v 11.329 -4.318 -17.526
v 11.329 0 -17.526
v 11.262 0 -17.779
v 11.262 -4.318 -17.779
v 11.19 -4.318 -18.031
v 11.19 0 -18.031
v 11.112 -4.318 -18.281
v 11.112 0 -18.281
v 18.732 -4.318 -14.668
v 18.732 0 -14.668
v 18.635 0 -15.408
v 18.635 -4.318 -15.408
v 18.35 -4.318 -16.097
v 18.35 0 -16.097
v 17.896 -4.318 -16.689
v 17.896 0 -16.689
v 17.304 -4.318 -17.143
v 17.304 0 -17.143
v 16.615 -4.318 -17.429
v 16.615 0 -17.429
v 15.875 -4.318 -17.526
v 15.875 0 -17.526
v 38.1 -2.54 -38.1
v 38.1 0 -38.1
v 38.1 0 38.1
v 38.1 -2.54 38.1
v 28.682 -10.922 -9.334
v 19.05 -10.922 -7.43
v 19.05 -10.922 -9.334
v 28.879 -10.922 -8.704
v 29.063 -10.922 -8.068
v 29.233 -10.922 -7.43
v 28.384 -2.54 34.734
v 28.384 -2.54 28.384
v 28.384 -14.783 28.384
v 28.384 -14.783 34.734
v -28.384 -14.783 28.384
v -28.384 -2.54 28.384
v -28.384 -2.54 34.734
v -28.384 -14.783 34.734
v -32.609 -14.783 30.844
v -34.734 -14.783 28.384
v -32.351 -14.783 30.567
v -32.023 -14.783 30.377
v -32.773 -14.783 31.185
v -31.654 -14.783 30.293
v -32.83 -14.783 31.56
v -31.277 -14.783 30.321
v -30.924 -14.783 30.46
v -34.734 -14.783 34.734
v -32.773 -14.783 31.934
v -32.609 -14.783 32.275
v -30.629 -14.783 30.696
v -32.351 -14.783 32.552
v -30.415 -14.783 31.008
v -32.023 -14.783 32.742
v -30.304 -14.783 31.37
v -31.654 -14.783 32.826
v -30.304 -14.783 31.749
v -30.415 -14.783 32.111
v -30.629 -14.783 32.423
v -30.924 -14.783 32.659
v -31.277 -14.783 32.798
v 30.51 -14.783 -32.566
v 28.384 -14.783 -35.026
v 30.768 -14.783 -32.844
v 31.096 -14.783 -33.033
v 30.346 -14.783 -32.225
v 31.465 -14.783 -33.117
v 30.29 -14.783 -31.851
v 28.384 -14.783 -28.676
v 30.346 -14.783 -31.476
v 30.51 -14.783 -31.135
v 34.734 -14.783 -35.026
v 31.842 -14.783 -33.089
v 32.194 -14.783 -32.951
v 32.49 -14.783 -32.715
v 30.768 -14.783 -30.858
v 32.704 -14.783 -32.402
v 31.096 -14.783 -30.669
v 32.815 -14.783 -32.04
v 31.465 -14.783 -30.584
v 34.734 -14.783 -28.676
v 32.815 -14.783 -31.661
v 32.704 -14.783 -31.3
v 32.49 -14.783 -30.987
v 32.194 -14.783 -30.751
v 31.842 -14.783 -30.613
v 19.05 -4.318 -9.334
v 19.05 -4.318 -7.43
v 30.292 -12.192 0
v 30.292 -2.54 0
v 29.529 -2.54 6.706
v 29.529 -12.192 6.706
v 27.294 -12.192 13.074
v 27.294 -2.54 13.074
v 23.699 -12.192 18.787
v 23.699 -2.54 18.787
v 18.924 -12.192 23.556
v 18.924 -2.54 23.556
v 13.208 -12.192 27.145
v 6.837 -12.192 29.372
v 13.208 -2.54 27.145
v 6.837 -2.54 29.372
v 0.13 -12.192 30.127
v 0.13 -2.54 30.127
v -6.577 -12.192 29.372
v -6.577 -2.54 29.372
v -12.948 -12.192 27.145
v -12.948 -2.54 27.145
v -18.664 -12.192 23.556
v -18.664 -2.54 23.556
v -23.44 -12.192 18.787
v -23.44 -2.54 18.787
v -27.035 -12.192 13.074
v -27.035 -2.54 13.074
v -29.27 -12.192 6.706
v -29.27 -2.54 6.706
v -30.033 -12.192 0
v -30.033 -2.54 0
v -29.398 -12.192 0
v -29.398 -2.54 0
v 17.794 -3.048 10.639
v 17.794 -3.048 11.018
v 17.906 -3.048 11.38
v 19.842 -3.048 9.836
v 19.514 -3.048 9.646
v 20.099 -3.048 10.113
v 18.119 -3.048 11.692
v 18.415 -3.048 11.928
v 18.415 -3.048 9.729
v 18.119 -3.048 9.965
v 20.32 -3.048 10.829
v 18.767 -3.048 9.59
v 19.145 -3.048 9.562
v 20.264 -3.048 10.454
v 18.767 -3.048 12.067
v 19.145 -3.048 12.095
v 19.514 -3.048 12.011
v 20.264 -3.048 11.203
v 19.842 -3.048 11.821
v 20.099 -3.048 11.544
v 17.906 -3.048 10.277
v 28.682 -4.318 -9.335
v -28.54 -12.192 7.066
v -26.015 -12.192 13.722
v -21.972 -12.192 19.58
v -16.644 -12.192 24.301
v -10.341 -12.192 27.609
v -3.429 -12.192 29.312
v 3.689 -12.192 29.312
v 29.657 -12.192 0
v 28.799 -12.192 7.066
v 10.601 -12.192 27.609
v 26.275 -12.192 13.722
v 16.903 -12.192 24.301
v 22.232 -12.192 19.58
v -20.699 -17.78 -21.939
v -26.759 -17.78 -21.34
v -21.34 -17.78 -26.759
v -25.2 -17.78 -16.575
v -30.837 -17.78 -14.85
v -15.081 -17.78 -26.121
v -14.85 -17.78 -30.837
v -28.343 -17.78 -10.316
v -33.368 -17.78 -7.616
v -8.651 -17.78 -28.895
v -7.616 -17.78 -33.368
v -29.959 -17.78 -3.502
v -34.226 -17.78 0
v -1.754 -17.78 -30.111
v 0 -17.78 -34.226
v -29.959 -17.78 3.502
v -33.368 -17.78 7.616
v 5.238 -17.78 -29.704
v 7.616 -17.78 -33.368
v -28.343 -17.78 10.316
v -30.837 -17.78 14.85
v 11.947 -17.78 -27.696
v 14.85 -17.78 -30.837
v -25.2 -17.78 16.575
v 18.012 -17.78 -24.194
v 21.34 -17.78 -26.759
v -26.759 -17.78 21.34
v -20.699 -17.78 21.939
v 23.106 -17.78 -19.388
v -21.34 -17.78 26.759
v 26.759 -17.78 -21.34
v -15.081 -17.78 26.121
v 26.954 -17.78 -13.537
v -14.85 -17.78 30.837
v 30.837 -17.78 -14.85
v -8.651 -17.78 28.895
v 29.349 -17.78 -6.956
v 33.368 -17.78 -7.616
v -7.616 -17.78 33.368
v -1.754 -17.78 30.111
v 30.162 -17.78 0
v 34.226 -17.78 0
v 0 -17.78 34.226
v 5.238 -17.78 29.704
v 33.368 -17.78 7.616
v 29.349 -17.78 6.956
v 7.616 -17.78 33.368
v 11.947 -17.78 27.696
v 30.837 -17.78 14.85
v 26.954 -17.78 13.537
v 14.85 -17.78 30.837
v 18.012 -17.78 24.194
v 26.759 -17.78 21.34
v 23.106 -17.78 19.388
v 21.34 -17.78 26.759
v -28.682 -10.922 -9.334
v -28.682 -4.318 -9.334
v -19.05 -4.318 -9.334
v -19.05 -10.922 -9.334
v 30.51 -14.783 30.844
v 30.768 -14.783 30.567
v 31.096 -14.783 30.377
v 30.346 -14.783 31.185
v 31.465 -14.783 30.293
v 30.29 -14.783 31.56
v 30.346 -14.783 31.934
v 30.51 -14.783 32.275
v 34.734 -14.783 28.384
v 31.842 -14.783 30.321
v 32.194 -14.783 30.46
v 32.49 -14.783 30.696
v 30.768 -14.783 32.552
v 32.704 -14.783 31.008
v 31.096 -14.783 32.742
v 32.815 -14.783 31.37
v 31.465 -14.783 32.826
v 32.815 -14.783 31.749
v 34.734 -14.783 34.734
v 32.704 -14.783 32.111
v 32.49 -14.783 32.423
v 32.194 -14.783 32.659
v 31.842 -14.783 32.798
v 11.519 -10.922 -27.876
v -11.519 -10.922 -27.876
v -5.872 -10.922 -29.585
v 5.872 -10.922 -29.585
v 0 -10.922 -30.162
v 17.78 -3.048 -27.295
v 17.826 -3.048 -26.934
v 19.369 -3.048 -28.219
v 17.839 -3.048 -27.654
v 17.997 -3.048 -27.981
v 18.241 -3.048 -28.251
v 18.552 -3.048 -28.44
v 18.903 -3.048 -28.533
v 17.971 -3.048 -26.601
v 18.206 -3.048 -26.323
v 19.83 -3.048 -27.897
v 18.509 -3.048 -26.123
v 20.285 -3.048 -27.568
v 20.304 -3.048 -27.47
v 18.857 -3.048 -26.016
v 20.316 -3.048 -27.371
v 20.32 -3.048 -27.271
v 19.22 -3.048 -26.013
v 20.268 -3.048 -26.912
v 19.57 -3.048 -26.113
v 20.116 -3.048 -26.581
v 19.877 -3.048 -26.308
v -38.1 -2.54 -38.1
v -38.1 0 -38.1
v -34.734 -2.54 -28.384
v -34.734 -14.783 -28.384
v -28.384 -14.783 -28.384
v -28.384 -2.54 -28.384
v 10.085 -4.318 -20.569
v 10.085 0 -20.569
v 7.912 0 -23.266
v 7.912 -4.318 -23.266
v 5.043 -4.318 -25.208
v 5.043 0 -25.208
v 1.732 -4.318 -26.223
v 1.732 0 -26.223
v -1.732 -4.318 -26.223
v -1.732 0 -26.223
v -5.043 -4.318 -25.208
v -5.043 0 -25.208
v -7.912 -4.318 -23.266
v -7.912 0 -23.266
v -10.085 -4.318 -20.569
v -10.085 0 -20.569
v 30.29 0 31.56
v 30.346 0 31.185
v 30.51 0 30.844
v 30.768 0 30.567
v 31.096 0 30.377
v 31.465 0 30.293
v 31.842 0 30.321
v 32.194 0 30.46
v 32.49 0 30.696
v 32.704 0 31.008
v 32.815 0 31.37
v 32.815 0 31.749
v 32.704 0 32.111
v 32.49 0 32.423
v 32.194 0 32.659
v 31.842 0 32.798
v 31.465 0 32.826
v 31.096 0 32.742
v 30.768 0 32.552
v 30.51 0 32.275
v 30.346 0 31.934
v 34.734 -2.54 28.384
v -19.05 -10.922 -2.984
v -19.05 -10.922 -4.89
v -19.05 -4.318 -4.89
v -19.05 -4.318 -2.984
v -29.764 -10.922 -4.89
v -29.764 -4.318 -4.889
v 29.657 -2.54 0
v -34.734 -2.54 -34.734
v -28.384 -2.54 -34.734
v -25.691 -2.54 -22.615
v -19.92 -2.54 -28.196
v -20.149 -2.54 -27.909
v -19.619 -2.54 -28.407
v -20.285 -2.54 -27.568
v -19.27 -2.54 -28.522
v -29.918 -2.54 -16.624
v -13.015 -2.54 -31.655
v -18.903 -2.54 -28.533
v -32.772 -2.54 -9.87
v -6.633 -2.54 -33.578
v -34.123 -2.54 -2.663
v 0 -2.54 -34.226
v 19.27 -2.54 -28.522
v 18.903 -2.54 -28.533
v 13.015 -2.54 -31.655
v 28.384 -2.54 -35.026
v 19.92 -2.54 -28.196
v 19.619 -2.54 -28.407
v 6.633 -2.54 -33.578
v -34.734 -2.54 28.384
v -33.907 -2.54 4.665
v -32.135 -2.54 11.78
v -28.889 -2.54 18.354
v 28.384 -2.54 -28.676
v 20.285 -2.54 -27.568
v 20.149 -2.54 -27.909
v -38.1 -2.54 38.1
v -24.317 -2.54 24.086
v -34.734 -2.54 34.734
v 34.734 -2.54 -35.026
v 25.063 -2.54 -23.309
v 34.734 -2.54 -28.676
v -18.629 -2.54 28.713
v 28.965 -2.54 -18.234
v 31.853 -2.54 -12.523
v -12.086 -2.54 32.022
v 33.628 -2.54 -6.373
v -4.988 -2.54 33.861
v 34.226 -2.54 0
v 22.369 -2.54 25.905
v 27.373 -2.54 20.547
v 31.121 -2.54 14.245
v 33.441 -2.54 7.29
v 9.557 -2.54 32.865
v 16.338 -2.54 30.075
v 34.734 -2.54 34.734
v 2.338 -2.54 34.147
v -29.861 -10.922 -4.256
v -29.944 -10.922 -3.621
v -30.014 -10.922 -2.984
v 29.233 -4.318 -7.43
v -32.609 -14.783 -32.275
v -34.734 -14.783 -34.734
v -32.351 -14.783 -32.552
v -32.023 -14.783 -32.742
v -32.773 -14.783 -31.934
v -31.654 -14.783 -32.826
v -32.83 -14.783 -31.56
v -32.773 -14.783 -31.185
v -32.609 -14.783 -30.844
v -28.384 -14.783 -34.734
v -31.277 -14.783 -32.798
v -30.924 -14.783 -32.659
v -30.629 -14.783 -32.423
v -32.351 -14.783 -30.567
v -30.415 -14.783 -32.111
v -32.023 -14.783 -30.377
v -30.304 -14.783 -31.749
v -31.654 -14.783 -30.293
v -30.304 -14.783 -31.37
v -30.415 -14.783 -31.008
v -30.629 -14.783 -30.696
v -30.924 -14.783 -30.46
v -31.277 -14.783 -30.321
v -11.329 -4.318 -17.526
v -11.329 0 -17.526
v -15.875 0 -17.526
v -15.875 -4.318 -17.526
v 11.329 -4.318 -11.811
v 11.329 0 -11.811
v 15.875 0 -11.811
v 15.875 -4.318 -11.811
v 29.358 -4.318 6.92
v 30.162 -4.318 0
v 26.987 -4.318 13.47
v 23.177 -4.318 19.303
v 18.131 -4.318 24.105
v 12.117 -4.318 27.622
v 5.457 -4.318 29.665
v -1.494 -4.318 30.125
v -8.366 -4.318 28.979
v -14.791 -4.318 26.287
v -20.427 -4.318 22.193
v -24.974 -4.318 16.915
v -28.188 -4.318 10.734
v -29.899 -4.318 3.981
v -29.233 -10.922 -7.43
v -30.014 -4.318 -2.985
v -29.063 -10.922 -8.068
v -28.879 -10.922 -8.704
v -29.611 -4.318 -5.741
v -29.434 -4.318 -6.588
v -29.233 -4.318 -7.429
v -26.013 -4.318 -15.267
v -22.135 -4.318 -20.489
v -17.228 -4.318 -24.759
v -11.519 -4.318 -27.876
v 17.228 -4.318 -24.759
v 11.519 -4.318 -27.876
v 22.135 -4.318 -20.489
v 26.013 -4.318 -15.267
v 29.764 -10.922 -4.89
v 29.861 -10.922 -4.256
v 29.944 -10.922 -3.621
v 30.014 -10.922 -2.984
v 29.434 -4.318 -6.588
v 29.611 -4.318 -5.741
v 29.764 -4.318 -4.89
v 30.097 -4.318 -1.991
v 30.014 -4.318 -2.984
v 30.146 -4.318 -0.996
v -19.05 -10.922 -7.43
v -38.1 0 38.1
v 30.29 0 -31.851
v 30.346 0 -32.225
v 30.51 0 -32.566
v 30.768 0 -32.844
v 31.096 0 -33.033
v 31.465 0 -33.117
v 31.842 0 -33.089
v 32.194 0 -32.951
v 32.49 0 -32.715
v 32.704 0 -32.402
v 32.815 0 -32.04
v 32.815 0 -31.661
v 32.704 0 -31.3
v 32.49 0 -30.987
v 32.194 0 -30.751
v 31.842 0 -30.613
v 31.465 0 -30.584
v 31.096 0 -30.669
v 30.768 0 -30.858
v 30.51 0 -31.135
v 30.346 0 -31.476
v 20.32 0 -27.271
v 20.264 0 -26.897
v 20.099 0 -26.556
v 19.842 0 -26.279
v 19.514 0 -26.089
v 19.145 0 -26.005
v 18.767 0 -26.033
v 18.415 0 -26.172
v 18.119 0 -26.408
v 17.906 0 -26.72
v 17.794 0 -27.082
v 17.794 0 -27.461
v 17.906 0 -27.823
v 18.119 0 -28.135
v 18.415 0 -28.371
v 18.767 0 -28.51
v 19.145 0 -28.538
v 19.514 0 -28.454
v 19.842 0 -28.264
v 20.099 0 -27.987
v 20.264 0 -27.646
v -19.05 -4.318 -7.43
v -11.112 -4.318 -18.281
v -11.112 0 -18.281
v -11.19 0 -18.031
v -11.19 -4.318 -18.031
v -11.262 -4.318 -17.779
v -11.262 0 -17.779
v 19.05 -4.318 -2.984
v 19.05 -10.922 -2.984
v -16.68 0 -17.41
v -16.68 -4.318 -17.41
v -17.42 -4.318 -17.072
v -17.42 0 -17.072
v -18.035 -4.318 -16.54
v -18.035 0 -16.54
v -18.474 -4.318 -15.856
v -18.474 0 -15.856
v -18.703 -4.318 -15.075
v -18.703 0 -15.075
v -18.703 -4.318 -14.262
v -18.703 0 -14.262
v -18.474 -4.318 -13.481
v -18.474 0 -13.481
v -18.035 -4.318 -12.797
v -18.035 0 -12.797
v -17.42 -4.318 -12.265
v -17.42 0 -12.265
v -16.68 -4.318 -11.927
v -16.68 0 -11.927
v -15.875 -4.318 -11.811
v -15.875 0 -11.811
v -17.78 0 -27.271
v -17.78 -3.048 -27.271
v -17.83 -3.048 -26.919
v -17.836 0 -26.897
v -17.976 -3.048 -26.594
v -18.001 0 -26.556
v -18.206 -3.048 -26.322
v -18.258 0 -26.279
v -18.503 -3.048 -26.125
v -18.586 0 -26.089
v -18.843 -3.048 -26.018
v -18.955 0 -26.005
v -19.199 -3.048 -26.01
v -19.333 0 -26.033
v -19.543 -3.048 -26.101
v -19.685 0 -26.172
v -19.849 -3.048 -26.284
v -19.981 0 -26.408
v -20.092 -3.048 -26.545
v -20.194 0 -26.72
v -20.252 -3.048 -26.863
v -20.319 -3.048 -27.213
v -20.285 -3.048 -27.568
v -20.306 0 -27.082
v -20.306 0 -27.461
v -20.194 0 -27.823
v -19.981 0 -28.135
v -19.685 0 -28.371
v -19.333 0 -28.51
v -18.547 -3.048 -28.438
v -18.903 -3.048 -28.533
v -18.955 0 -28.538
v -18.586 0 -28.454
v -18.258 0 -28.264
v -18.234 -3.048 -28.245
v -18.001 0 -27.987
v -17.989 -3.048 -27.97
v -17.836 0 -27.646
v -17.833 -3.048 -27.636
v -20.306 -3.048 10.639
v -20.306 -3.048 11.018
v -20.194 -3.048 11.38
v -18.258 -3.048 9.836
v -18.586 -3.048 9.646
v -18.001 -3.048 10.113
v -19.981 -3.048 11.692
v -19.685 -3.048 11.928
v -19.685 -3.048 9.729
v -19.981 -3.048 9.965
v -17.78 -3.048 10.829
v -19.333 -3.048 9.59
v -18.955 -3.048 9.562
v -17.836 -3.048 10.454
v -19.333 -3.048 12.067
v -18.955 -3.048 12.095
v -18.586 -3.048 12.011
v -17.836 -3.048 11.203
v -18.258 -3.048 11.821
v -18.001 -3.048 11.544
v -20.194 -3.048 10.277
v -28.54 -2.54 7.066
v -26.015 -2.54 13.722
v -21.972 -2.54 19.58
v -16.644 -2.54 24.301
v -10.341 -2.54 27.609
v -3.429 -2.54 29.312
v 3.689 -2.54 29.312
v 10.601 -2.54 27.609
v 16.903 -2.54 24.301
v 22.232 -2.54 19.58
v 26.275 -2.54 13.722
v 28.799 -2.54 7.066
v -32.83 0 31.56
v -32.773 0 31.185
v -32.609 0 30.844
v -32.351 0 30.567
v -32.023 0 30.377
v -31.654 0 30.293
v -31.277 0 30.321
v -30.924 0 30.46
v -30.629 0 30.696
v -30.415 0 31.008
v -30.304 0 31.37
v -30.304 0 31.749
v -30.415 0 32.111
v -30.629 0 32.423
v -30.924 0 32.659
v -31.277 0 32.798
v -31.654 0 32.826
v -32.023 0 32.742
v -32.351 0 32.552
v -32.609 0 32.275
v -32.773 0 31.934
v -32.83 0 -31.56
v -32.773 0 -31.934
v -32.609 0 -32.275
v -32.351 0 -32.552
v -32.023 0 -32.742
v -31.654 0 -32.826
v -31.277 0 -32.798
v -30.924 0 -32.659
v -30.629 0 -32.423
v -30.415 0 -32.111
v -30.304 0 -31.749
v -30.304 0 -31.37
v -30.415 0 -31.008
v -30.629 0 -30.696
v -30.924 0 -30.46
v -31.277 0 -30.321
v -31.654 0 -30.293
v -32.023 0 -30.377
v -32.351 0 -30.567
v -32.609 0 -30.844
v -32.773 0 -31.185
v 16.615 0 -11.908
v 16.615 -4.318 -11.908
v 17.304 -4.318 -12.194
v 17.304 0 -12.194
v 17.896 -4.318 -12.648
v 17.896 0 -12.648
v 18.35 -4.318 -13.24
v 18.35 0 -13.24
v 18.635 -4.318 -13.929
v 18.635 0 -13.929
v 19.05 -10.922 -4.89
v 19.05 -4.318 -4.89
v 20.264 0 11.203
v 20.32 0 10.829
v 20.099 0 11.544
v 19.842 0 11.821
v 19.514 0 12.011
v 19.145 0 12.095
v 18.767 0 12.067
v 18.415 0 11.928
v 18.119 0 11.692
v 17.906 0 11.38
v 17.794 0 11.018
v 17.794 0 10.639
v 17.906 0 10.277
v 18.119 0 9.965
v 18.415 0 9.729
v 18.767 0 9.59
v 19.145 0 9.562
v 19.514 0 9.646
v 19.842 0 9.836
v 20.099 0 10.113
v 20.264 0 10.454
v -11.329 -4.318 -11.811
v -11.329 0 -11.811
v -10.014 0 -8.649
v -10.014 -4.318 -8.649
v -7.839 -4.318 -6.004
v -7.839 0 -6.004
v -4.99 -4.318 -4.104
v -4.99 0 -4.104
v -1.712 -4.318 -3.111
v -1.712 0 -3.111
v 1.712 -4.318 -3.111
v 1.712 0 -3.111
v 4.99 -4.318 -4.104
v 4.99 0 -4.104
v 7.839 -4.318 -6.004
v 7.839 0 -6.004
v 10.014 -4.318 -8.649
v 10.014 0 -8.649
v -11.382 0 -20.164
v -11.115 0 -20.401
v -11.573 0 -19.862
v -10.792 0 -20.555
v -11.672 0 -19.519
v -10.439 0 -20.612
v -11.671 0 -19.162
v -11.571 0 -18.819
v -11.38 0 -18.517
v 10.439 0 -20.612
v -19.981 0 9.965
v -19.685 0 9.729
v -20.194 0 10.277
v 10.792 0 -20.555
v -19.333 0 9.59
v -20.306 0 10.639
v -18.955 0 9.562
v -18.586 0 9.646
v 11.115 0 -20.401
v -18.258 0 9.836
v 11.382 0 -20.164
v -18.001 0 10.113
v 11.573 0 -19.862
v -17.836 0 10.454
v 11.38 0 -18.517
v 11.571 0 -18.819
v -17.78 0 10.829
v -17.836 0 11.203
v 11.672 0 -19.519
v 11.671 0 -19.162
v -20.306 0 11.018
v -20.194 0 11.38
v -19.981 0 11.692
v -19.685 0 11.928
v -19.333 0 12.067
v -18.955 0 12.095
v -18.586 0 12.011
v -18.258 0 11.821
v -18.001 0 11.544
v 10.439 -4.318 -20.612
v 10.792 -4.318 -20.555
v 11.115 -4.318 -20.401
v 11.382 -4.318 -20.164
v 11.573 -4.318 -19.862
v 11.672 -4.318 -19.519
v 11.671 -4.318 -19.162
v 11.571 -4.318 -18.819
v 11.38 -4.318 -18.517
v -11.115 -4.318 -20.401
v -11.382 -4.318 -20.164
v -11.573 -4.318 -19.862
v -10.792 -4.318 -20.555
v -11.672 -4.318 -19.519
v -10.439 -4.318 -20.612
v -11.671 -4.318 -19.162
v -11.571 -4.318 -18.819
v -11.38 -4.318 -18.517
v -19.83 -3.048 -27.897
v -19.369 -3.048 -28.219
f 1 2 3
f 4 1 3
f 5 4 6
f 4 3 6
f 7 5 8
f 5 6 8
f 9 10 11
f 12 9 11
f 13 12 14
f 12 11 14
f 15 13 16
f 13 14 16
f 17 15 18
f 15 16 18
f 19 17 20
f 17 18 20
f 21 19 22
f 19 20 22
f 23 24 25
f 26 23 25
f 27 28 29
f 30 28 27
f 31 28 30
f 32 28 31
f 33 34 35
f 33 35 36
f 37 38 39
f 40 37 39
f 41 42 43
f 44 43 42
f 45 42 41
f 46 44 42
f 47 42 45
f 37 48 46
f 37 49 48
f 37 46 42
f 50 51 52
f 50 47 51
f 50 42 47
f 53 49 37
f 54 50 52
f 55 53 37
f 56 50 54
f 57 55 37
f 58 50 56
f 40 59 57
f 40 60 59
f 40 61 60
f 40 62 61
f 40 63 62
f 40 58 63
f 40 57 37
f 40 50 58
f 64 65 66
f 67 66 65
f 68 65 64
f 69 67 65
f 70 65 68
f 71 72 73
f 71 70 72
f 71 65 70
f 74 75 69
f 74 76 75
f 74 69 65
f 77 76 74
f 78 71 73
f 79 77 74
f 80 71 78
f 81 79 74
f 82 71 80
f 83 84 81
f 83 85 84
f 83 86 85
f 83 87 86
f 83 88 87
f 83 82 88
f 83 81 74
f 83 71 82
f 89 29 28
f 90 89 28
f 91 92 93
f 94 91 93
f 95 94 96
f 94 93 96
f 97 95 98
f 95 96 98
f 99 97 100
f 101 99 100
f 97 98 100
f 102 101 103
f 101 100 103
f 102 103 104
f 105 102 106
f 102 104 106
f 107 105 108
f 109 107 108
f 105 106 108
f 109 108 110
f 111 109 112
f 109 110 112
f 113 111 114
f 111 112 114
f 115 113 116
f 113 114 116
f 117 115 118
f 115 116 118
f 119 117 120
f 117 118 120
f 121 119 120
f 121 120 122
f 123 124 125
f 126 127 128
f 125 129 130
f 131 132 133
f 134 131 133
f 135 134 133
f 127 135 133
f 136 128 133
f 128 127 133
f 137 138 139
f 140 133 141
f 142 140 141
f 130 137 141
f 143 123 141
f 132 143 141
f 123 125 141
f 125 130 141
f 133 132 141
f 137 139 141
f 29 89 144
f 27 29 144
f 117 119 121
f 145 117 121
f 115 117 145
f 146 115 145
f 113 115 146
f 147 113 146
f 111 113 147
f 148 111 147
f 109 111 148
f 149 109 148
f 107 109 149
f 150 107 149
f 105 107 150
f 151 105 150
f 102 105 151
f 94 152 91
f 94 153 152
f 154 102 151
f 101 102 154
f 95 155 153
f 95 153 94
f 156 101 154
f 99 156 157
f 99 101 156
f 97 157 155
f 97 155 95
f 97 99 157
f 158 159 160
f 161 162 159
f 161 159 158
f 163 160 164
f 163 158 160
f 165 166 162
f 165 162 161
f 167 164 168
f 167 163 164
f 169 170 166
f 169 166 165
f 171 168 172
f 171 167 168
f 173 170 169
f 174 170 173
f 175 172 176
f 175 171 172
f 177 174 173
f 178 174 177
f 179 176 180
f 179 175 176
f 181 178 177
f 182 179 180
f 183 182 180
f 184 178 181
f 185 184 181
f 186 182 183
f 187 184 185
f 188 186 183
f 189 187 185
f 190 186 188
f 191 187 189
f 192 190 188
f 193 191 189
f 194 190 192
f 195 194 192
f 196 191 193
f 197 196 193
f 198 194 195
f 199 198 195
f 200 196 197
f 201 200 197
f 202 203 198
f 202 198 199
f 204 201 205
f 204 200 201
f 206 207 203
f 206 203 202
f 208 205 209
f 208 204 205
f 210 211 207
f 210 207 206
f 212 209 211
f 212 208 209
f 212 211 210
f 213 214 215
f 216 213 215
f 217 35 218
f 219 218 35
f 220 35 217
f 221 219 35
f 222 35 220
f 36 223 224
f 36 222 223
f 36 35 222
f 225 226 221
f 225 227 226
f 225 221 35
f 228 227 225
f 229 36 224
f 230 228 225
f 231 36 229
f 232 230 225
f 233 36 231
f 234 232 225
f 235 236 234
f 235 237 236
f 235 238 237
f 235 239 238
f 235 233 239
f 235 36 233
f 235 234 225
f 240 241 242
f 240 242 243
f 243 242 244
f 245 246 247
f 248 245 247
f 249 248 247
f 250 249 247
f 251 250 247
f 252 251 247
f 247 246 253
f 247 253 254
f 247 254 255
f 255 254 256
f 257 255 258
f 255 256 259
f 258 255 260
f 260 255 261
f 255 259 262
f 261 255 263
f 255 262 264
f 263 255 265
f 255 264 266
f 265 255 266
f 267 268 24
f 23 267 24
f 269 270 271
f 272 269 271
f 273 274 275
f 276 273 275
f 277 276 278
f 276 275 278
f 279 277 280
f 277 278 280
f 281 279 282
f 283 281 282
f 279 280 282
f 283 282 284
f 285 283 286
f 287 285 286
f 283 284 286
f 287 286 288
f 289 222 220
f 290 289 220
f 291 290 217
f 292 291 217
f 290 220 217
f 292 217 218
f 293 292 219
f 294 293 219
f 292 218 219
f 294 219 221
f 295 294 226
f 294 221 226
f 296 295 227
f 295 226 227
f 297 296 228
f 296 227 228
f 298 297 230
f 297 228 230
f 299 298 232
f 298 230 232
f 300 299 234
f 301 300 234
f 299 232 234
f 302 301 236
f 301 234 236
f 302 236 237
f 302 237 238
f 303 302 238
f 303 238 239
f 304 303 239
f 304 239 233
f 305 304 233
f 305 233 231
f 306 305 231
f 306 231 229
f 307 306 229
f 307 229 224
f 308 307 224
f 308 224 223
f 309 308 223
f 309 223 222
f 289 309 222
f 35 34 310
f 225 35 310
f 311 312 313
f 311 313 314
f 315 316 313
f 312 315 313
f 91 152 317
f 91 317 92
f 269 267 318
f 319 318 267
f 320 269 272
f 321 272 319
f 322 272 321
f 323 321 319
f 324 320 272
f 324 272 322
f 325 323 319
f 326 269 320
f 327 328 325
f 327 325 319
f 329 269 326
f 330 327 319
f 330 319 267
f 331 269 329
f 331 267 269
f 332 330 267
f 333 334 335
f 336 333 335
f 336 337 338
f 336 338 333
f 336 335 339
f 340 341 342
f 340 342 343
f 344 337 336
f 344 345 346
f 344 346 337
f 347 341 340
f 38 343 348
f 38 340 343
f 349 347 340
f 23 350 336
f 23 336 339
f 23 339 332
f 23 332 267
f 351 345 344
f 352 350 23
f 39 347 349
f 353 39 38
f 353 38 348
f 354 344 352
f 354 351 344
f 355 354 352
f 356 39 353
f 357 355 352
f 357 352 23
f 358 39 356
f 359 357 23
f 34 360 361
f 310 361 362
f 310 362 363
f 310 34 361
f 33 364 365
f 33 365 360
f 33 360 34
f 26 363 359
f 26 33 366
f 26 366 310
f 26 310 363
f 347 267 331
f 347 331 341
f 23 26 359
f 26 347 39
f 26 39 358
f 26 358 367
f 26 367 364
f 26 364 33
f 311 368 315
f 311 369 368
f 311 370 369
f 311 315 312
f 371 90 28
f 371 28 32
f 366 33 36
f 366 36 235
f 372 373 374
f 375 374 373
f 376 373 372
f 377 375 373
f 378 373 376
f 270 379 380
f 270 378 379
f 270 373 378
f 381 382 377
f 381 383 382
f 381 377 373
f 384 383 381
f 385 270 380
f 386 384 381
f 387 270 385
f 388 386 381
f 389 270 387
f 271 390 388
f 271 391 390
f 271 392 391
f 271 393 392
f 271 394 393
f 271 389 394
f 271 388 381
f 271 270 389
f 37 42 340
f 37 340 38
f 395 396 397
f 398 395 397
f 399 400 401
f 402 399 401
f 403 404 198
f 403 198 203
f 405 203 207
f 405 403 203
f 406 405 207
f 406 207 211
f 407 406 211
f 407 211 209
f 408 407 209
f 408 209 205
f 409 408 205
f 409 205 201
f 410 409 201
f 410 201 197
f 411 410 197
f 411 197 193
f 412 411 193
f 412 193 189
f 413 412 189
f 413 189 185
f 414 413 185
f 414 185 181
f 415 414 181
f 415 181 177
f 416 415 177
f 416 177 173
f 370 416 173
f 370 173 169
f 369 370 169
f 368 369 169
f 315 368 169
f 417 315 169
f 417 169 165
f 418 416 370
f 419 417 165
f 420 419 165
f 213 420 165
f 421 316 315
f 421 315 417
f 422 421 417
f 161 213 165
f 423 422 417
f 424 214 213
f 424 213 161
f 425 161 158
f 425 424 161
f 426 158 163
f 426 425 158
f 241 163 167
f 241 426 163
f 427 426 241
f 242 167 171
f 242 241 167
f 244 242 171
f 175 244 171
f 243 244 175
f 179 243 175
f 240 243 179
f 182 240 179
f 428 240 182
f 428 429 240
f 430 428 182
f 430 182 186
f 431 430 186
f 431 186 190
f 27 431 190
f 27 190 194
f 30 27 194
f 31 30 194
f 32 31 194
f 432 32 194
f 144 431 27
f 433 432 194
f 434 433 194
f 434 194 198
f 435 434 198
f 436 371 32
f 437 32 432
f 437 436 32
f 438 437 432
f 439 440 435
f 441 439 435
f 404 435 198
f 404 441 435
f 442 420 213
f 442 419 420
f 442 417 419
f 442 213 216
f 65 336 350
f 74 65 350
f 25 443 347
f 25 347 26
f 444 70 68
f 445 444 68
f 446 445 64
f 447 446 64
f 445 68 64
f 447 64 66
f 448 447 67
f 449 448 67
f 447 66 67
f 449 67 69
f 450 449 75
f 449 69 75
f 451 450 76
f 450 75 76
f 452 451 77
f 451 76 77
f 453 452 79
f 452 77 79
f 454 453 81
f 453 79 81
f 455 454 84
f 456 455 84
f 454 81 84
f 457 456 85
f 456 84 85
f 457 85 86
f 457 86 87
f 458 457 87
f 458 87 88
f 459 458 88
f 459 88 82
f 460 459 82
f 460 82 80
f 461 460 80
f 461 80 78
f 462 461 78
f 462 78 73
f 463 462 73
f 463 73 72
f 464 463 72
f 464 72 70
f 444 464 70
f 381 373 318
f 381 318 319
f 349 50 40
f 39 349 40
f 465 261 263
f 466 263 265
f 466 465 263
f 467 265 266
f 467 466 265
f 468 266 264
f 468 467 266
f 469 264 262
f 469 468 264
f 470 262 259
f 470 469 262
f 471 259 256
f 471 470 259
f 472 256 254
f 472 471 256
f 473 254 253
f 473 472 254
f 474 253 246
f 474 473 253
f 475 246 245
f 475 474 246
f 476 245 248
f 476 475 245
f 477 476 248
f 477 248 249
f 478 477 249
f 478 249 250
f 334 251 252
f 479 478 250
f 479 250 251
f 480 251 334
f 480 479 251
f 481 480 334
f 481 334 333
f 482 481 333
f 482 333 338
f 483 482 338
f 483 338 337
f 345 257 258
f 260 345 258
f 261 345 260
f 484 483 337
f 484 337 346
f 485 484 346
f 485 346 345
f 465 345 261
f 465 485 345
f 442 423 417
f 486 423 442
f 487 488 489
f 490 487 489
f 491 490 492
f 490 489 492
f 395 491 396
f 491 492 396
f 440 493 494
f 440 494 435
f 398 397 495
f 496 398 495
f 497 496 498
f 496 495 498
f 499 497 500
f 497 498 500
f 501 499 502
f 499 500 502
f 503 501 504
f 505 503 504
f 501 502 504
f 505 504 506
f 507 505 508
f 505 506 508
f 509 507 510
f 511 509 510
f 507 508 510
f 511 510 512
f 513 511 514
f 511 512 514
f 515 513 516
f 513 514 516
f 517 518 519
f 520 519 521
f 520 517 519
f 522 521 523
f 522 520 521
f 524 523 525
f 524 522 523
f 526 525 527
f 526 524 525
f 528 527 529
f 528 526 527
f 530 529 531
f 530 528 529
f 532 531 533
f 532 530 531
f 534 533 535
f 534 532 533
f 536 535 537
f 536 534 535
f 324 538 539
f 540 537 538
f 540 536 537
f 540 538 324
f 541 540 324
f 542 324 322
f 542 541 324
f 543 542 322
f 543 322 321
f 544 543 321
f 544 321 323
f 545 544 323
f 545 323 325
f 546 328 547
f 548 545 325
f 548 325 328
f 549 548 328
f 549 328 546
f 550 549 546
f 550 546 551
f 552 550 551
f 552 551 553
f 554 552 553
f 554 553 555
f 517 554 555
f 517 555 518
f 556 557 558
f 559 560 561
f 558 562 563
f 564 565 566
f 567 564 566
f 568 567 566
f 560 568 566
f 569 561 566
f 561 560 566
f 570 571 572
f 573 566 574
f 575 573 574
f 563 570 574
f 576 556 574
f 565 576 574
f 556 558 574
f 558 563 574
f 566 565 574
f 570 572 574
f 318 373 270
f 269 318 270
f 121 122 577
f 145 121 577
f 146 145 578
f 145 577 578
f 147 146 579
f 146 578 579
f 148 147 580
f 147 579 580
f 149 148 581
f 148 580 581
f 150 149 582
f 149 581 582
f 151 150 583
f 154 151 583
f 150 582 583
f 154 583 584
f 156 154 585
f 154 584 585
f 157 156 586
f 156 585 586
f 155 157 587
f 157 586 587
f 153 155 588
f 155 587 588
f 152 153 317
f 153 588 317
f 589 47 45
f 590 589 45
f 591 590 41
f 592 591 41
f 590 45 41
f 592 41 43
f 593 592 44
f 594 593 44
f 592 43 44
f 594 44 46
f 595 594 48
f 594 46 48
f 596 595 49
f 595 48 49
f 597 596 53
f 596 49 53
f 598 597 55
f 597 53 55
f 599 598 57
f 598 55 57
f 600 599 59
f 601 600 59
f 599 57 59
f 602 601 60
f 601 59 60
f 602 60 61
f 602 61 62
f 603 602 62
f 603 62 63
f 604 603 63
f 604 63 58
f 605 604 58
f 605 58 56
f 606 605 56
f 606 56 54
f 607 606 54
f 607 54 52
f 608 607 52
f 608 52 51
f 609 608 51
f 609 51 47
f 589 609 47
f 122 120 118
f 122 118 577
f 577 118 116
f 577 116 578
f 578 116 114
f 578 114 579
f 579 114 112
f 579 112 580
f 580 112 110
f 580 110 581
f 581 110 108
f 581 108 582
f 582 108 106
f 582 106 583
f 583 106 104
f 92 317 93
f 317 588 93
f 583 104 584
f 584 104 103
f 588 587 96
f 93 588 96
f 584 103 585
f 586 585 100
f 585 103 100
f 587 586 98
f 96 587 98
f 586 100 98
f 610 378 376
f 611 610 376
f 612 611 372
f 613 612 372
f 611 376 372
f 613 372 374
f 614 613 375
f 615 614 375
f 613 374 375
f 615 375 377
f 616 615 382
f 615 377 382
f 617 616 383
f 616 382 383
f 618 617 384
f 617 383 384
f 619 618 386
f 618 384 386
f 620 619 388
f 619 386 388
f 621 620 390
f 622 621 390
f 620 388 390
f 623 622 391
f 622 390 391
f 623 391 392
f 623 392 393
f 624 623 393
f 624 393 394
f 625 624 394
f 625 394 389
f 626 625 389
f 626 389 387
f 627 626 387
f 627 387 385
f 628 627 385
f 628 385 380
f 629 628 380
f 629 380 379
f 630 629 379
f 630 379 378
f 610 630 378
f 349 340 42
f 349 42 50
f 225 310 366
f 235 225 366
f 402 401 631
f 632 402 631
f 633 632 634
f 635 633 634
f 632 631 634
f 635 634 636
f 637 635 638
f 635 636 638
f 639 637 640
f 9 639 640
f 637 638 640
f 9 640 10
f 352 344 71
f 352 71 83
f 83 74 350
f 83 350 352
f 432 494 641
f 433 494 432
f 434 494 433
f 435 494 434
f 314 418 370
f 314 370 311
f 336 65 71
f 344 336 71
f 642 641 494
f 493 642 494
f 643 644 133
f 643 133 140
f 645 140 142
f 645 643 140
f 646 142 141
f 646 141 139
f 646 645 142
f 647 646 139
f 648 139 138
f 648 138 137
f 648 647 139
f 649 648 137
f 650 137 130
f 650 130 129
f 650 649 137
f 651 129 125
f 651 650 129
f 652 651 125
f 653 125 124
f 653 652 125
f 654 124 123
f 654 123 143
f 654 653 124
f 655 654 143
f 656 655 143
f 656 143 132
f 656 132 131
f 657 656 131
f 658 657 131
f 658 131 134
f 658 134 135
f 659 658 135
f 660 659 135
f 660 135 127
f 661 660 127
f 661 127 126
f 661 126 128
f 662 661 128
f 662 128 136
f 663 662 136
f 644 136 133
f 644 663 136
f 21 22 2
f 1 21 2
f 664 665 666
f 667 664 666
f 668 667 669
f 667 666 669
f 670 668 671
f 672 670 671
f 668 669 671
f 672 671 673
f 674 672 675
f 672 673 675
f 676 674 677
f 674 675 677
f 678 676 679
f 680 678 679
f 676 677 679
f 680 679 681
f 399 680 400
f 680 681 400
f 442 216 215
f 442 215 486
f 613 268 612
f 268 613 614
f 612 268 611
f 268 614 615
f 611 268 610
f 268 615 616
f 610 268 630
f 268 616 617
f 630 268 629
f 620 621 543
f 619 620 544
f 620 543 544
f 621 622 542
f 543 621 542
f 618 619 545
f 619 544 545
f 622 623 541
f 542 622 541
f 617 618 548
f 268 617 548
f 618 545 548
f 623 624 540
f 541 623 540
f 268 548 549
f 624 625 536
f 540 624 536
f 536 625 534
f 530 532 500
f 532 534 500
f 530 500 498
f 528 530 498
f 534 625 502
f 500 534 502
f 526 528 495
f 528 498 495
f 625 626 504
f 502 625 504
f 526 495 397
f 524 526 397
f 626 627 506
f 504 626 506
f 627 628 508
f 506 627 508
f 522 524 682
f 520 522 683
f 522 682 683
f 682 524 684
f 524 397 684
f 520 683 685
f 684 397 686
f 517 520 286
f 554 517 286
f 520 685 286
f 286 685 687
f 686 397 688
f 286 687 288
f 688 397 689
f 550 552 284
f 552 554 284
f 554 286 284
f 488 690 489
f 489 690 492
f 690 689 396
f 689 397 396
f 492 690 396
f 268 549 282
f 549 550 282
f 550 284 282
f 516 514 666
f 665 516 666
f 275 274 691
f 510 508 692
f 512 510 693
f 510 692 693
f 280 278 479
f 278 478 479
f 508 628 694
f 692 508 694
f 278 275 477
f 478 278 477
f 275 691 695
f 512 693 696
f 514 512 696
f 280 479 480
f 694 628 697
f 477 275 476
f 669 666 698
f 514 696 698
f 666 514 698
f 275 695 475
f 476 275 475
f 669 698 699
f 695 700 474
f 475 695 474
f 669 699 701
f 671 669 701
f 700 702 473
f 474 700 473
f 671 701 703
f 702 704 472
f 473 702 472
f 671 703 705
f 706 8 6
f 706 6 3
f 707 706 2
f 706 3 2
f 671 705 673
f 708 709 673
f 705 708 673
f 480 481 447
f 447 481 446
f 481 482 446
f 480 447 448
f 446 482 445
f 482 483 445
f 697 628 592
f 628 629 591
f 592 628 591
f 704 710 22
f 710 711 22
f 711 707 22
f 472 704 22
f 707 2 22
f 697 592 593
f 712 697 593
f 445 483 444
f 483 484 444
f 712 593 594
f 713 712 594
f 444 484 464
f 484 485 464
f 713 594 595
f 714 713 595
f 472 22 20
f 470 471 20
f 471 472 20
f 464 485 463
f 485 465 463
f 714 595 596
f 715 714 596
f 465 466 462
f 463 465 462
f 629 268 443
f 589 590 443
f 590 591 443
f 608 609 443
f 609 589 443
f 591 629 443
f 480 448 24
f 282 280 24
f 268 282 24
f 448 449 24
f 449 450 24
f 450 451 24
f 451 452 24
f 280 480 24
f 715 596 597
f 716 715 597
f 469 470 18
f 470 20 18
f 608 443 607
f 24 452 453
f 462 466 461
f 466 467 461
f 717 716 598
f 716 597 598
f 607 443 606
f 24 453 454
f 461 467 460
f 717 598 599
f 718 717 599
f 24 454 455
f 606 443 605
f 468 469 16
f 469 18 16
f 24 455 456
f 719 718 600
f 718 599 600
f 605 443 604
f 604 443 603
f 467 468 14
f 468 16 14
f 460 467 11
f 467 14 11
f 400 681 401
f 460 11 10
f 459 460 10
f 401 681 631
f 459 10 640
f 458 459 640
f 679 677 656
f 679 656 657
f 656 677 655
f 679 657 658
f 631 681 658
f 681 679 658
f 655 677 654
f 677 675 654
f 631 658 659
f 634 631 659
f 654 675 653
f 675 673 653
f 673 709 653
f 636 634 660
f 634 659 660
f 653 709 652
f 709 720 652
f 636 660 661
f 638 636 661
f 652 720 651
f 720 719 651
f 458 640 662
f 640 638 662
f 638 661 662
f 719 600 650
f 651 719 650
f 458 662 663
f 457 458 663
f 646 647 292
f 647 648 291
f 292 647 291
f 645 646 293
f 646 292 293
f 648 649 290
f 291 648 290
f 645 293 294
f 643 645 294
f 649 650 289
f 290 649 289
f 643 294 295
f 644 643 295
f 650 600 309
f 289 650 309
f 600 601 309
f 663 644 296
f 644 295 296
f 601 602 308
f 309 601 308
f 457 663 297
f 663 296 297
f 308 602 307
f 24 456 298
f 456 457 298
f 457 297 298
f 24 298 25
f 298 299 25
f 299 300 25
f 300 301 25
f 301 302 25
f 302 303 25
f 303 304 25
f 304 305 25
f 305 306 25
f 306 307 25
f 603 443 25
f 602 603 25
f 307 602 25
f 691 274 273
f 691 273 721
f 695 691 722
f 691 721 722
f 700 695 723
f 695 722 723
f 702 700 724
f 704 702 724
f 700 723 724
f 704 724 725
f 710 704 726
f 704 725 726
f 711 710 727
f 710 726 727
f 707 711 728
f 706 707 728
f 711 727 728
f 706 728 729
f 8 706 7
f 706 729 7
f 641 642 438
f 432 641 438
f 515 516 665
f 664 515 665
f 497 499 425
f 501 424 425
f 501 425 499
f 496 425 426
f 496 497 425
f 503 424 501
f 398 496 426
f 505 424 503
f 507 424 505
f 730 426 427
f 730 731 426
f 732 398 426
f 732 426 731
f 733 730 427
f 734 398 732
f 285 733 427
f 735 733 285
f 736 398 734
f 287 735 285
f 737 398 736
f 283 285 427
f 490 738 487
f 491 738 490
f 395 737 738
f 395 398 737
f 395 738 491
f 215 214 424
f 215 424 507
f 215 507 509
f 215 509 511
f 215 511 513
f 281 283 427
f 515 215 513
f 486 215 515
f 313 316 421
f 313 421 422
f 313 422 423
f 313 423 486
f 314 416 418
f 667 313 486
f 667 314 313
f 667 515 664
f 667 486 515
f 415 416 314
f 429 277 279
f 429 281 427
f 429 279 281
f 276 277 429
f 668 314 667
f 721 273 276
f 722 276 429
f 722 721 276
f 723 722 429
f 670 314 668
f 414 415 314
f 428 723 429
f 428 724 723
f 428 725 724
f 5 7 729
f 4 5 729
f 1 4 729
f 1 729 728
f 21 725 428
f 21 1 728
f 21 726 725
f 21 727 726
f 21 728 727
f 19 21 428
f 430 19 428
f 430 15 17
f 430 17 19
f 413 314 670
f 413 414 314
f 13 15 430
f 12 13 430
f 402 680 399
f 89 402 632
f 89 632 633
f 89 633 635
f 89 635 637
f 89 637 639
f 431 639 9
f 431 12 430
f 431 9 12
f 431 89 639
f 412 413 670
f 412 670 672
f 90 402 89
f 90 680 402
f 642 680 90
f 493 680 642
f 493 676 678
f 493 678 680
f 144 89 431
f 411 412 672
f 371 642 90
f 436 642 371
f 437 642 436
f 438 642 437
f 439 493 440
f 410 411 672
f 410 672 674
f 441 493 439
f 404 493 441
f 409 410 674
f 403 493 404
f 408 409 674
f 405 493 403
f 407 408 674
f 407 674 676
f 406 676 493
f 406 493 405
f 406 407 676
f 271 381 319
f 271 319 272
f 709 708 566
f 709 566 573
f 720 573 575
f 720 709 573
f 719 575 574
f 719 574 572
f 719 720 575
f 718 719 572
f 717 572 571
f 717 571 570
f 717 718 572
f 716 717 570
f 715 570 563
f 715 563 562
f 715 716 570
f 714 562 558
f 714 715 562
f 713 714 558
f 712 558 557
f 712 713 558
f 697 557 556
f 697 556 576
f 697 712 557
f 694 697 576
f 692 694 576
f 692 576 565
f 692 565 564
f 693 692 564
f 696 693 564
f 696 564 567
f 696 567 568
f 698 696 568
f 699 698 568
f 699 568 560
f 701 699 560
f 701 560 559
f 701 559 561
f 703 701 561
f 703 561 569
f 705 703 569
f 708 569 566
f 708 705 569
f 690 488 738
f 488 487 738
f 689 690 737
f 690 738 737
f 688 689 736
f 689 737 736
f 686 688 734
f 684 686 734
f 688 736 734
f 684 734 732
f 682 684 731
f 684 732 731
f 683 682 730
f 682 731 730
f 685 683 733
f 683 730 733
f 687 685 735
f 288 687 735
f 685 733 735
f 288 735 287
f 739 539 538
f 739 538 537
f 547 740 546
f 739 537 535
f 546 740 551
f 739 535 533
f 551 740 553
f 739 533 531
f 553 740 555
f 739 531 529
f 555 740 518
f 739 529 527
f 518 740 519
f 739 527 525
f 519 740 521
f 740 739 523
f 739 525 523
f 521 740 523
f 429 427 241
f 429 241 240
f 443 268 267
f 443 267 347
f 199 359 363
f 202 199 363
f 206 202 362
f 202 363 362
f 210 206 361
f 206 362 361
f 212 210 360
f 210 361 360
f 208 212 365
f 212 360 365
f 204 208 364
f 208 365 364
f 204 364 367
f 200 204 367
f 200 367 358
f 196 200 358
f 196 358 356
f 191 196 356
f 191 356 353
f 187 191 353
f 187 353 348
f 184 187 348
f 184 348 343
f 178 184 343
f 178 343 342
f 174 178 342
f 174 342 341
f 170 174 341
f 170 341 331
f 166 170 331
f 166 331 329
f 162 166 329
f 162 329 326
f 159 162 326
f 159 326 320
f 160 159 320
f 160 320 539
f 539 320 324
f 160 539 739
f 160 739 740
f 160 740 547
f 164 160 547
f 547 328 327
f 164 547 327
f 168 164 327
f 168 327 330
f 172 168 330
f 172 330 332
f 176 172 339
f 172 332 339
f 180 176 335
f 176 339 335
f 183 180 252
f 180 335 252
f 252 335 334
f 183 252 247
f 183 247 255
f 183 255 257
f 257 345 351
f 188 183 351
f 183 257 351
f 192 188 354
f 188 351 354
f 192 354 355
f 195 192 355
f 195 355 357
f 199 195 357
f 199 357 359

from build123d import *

# Parameters (mm, degrees)
F0_R      = 30.1625
F1_DEPTH  = 4.318
F2_D      = 2.54
F3_DEPTH  = 10.922
F4_R      = 34.2265
F4_R_2    = 30.1625
F5_DEPTH  = 17.78
F0_W      = 76.2
F0_H      = 76.2
F0_W_2    = 6.35
F0_H_2    = 6.35
F8_DEPTH  = 2.54
F10_DEPTH = 9.652
F11_R     = 1.27
F12_DEPTH = 3.048
F7_W      = 25.4
F7_H      = 2.54
F7_W_2    = 12.7
F7_H_2    = 1.905
F13_DEPTH = 8.382
F14_DEPTH = 14.7828
F15_D     = 2.54


with BuildPart() as f1:
    # F0 (on Front) → F1 (new body)
    with BuildSketch(Plane.XZ):
        Circle(F0_R)
        with BuildLine():
            ThreePointArc((-11.329190163, -11.811), (0, -2.9845), (11.329190163, -11.811))
            Line((11.329190163, -11.811), (15.875, -11.811))
            ThreePointArc((15.875, -11.811), (17.8955576272, -12.6479423728), (18.7325, -14.6685))
            ThreePointArc((18.7325, -14.6685), (17.8955576272, -16.6890576272), (15.875, -17.526))
            Line((15.875, -17.526), (11.329190163, -17.526))
            ThreePointArc((11.329190163, -17.526), (0, -26.3525), (-11.329190163, -17.526))
            Line((-11.329190163, -17.526), (-15.875, -17.526))
            ThreePointArc((-15.875, -17.526), (-18.7325, -14.6685), (-15.875, -11.811))
            Line((-15.875, -11.811), (-11.329190163, -11.811))
        make_face(mode=Mode.SUBTRACT)
    extrude(amount=F1_DEPTH)

    # F2 (through all)
    with Locations(Plane(origin=(0, 0, 0), x_dir=(1, 0, 0), z_dir=(0, 1, 0))):
        with Locations((-10.414, 19.3421), (10.414, 19.3421)):
            Hole(F2_D / 2)

    # F0 (on Front) → F3 (cut)
    with BuildSketch(Plane.XZ):
        Circle(F0_R)
        with BuildLine():
            ThreePointArc((-11.329190163, -11.811), (0, -2.9845), (11.329190163, -11.811))
            Line((11.329190163, -11.811), (15.875, -11.811))
            ThreePointArc((15.875, -11.811), (17.8955576272, -12.6479423728), (18.7325, -14.6685))
            ThreePointArc((18.7325, -14.6685), (17.8955576272, -16.6890576272), (15.875, -17.526))
            Line((15.875, -17.526), (11.329190163, -17.526))
            ThreePointArc((11.329190163, -17.526), (0, -26.3525), (-11.329190163, -17.526))
            Line((-11.329190163, -17.526), (-15.875, -17.526))
            ThreePointArc((-15.875, -17.526), (-18.7325, -14.6685), (-15.875, -11.811))
            Line((-15.875, -11.811), (-11.329190163, -11.811))
        make_face(mode=Mode.SUBTRACT)
        with BuildLine():
            ThreePointArc((-13.0175, -14.6685), (-13.8544423728, -12.6479423728), (-15.875, -11.811))
            Line((-15.875, -11.811), (-15.875, -17.526))
            ThreePointArc((-15.875, -17.526), (-13.8544423728, -16.6890576272), (-13.0175, -14.6685))
        make_face()
        with BuildLine():
            Line((-15.875, -17.526), (-15.875, -11.811))
            ThreePointArc((-15.875, -11.811), (-18.7325, -14.6685), (-15.875, -17.526))
        make_face()
        with BuildLine():
            Line((15.875, -17.526), (15.875, -11.811))
            ThreePointArc((15.875, -11.811), (13.0175, -14.6685), (15.875, -17.526))
        make_face()
        with BuildLine():
            ThreePointArc((18.7325, -14.6685), (17.8955576272, -12.6479423728), (15.875, -11.811))
            Line((15.875, -11.811), (15.875, -17.526))
            ThreePointArc((15.875, -17.526), (17.8955576272, -16.6890576272), (18.7325, -14.6685))
        make_face()
    extrude(amount=-F3_DEPTH, mode=Mode.SUBTRACT)

    # F4 (on Front) → F5 (join)
    with BuildSketch(Plane.XZ):
        Circle(F4_R)
        Circle(F4_R_2, mode=Mode.SUBTRACT)
    extrude(amount=F5_DEPTH)

    # F0 (on Front) → F8 (join)
    with BuildSketch(Plane.XZ):
        Rectangle(F0_W, F0_H)
        with Locations((-31.5595, -31.5595)):
            Rectangle(F0_W_2, F0_H_2, mode=Mode.SUBTRACT)
        with Locations((31.5595, -31.8507122787)):
            Rectangle(F0_W_2, F0_H_2, mode=Mode.SUBTRACT)
        with Locations((-31.5595, 31.5595)):
            Rectangle(F0_W_2, F0_H_2, mode=Mode.SUBTRACT)
        Circle(F0_R, mode=Mode.SUBTRACT)
        with Locations((31.5595, 31.5595)):
            Rectangle(F0_W_2, F0_H_2, mode=Mode.SUBTRACT)
    extrude(amount=F8_DEPTH)

    # F11 (on Front) → F12 (cut)
    with BuildSketch(Plane.XZ):
        with Locations((19.05, 10.8285026)):
            Circle(F11_R)
        with Locations((-19.05, 10.8285026)):
            Circle(F11_R)
        with Locations((-19.05, -27.2714974)):
            Circle(F11_R)
        with Locations((19.05, -27.2714974)):
            Circle(F11_R)
    extrude(amount=F12_DEPTH, mode=Mode.SUBTRACT)

    # F7 (on offset) → F13 (join)
    with BuildSketch(Plane.XZ.offset(2.54)):
        with Locations((0, -29.1465)):
            Rectangle(F7_W, F7_H)
        with Locations((-25.4, -3.937)):
            Rectangle(F7_W_2, F7_H_2)
        with Locations((-25.4, -8.382)):
            Rectangle(F7_W_2, F7_H_2)
        with Locations((25.4, -8.382)):
            Rectangle(F7_W_2, F7_H_2)
        with Locations((25.4, -3.937)):
            Rectangle(F7_W_2, F7_H_2)
    extrude(amount=F13_DEPTH)

    # F0 (on Front) → F14 (join)
    with BuildSketch(Plane.XZ):
        with Locations((-31.5595, -31.5595)):
            Rectangle(F0_W_2, F0_H_2)
        with Locations((-31.5595, 31.5595)):
            Rectangle(F0_W_2, F0_H_2)
        with Locations((31.5595, 31.5595)):
            Rectangle(F0_W_2, F0_H_2)
        with Locations((31.5595, -31.8507122787)):
            Rectangle(F0_W_2, F0_H_2)
    extrude(amount=F14_DEPTH)

    # F15 (through all)
    with Locations(Plane(origin=(0, 0, 0), x_dir=(1, 0, 0), z_dir=(0, 1, 0))):
        with Locations((-31.5595, -31.5595), (31.5595, -31.5595), (-31.5595, 31.5595), (31.5595, 31.8507122787)):
            Hole(F15_D / 2)


with BuildPart() as f10:
    # F9 (on offset) → F10 (new body)
    with BuildSketch(Plane.XZ.offset(2.54)):
        with BuildLine():
            Line((29.6573994599, 0), (30.2923994599, 0))
            ThreePointArc((30.2923994599, 0), (0.1299199818, 30.1273150478), (-30.0325594963, 0))
            Line((-30.0325594963, 0), (-29.3975594963, 0))
            ThreePointArc((-29.3975594963, 0), (0.1299199818, 29.5274794781), (29.6573994599, 0))
        make_face()
    extrude(amount=F10_DEPTH)


solid = Compound([f1.part, f10.part])
